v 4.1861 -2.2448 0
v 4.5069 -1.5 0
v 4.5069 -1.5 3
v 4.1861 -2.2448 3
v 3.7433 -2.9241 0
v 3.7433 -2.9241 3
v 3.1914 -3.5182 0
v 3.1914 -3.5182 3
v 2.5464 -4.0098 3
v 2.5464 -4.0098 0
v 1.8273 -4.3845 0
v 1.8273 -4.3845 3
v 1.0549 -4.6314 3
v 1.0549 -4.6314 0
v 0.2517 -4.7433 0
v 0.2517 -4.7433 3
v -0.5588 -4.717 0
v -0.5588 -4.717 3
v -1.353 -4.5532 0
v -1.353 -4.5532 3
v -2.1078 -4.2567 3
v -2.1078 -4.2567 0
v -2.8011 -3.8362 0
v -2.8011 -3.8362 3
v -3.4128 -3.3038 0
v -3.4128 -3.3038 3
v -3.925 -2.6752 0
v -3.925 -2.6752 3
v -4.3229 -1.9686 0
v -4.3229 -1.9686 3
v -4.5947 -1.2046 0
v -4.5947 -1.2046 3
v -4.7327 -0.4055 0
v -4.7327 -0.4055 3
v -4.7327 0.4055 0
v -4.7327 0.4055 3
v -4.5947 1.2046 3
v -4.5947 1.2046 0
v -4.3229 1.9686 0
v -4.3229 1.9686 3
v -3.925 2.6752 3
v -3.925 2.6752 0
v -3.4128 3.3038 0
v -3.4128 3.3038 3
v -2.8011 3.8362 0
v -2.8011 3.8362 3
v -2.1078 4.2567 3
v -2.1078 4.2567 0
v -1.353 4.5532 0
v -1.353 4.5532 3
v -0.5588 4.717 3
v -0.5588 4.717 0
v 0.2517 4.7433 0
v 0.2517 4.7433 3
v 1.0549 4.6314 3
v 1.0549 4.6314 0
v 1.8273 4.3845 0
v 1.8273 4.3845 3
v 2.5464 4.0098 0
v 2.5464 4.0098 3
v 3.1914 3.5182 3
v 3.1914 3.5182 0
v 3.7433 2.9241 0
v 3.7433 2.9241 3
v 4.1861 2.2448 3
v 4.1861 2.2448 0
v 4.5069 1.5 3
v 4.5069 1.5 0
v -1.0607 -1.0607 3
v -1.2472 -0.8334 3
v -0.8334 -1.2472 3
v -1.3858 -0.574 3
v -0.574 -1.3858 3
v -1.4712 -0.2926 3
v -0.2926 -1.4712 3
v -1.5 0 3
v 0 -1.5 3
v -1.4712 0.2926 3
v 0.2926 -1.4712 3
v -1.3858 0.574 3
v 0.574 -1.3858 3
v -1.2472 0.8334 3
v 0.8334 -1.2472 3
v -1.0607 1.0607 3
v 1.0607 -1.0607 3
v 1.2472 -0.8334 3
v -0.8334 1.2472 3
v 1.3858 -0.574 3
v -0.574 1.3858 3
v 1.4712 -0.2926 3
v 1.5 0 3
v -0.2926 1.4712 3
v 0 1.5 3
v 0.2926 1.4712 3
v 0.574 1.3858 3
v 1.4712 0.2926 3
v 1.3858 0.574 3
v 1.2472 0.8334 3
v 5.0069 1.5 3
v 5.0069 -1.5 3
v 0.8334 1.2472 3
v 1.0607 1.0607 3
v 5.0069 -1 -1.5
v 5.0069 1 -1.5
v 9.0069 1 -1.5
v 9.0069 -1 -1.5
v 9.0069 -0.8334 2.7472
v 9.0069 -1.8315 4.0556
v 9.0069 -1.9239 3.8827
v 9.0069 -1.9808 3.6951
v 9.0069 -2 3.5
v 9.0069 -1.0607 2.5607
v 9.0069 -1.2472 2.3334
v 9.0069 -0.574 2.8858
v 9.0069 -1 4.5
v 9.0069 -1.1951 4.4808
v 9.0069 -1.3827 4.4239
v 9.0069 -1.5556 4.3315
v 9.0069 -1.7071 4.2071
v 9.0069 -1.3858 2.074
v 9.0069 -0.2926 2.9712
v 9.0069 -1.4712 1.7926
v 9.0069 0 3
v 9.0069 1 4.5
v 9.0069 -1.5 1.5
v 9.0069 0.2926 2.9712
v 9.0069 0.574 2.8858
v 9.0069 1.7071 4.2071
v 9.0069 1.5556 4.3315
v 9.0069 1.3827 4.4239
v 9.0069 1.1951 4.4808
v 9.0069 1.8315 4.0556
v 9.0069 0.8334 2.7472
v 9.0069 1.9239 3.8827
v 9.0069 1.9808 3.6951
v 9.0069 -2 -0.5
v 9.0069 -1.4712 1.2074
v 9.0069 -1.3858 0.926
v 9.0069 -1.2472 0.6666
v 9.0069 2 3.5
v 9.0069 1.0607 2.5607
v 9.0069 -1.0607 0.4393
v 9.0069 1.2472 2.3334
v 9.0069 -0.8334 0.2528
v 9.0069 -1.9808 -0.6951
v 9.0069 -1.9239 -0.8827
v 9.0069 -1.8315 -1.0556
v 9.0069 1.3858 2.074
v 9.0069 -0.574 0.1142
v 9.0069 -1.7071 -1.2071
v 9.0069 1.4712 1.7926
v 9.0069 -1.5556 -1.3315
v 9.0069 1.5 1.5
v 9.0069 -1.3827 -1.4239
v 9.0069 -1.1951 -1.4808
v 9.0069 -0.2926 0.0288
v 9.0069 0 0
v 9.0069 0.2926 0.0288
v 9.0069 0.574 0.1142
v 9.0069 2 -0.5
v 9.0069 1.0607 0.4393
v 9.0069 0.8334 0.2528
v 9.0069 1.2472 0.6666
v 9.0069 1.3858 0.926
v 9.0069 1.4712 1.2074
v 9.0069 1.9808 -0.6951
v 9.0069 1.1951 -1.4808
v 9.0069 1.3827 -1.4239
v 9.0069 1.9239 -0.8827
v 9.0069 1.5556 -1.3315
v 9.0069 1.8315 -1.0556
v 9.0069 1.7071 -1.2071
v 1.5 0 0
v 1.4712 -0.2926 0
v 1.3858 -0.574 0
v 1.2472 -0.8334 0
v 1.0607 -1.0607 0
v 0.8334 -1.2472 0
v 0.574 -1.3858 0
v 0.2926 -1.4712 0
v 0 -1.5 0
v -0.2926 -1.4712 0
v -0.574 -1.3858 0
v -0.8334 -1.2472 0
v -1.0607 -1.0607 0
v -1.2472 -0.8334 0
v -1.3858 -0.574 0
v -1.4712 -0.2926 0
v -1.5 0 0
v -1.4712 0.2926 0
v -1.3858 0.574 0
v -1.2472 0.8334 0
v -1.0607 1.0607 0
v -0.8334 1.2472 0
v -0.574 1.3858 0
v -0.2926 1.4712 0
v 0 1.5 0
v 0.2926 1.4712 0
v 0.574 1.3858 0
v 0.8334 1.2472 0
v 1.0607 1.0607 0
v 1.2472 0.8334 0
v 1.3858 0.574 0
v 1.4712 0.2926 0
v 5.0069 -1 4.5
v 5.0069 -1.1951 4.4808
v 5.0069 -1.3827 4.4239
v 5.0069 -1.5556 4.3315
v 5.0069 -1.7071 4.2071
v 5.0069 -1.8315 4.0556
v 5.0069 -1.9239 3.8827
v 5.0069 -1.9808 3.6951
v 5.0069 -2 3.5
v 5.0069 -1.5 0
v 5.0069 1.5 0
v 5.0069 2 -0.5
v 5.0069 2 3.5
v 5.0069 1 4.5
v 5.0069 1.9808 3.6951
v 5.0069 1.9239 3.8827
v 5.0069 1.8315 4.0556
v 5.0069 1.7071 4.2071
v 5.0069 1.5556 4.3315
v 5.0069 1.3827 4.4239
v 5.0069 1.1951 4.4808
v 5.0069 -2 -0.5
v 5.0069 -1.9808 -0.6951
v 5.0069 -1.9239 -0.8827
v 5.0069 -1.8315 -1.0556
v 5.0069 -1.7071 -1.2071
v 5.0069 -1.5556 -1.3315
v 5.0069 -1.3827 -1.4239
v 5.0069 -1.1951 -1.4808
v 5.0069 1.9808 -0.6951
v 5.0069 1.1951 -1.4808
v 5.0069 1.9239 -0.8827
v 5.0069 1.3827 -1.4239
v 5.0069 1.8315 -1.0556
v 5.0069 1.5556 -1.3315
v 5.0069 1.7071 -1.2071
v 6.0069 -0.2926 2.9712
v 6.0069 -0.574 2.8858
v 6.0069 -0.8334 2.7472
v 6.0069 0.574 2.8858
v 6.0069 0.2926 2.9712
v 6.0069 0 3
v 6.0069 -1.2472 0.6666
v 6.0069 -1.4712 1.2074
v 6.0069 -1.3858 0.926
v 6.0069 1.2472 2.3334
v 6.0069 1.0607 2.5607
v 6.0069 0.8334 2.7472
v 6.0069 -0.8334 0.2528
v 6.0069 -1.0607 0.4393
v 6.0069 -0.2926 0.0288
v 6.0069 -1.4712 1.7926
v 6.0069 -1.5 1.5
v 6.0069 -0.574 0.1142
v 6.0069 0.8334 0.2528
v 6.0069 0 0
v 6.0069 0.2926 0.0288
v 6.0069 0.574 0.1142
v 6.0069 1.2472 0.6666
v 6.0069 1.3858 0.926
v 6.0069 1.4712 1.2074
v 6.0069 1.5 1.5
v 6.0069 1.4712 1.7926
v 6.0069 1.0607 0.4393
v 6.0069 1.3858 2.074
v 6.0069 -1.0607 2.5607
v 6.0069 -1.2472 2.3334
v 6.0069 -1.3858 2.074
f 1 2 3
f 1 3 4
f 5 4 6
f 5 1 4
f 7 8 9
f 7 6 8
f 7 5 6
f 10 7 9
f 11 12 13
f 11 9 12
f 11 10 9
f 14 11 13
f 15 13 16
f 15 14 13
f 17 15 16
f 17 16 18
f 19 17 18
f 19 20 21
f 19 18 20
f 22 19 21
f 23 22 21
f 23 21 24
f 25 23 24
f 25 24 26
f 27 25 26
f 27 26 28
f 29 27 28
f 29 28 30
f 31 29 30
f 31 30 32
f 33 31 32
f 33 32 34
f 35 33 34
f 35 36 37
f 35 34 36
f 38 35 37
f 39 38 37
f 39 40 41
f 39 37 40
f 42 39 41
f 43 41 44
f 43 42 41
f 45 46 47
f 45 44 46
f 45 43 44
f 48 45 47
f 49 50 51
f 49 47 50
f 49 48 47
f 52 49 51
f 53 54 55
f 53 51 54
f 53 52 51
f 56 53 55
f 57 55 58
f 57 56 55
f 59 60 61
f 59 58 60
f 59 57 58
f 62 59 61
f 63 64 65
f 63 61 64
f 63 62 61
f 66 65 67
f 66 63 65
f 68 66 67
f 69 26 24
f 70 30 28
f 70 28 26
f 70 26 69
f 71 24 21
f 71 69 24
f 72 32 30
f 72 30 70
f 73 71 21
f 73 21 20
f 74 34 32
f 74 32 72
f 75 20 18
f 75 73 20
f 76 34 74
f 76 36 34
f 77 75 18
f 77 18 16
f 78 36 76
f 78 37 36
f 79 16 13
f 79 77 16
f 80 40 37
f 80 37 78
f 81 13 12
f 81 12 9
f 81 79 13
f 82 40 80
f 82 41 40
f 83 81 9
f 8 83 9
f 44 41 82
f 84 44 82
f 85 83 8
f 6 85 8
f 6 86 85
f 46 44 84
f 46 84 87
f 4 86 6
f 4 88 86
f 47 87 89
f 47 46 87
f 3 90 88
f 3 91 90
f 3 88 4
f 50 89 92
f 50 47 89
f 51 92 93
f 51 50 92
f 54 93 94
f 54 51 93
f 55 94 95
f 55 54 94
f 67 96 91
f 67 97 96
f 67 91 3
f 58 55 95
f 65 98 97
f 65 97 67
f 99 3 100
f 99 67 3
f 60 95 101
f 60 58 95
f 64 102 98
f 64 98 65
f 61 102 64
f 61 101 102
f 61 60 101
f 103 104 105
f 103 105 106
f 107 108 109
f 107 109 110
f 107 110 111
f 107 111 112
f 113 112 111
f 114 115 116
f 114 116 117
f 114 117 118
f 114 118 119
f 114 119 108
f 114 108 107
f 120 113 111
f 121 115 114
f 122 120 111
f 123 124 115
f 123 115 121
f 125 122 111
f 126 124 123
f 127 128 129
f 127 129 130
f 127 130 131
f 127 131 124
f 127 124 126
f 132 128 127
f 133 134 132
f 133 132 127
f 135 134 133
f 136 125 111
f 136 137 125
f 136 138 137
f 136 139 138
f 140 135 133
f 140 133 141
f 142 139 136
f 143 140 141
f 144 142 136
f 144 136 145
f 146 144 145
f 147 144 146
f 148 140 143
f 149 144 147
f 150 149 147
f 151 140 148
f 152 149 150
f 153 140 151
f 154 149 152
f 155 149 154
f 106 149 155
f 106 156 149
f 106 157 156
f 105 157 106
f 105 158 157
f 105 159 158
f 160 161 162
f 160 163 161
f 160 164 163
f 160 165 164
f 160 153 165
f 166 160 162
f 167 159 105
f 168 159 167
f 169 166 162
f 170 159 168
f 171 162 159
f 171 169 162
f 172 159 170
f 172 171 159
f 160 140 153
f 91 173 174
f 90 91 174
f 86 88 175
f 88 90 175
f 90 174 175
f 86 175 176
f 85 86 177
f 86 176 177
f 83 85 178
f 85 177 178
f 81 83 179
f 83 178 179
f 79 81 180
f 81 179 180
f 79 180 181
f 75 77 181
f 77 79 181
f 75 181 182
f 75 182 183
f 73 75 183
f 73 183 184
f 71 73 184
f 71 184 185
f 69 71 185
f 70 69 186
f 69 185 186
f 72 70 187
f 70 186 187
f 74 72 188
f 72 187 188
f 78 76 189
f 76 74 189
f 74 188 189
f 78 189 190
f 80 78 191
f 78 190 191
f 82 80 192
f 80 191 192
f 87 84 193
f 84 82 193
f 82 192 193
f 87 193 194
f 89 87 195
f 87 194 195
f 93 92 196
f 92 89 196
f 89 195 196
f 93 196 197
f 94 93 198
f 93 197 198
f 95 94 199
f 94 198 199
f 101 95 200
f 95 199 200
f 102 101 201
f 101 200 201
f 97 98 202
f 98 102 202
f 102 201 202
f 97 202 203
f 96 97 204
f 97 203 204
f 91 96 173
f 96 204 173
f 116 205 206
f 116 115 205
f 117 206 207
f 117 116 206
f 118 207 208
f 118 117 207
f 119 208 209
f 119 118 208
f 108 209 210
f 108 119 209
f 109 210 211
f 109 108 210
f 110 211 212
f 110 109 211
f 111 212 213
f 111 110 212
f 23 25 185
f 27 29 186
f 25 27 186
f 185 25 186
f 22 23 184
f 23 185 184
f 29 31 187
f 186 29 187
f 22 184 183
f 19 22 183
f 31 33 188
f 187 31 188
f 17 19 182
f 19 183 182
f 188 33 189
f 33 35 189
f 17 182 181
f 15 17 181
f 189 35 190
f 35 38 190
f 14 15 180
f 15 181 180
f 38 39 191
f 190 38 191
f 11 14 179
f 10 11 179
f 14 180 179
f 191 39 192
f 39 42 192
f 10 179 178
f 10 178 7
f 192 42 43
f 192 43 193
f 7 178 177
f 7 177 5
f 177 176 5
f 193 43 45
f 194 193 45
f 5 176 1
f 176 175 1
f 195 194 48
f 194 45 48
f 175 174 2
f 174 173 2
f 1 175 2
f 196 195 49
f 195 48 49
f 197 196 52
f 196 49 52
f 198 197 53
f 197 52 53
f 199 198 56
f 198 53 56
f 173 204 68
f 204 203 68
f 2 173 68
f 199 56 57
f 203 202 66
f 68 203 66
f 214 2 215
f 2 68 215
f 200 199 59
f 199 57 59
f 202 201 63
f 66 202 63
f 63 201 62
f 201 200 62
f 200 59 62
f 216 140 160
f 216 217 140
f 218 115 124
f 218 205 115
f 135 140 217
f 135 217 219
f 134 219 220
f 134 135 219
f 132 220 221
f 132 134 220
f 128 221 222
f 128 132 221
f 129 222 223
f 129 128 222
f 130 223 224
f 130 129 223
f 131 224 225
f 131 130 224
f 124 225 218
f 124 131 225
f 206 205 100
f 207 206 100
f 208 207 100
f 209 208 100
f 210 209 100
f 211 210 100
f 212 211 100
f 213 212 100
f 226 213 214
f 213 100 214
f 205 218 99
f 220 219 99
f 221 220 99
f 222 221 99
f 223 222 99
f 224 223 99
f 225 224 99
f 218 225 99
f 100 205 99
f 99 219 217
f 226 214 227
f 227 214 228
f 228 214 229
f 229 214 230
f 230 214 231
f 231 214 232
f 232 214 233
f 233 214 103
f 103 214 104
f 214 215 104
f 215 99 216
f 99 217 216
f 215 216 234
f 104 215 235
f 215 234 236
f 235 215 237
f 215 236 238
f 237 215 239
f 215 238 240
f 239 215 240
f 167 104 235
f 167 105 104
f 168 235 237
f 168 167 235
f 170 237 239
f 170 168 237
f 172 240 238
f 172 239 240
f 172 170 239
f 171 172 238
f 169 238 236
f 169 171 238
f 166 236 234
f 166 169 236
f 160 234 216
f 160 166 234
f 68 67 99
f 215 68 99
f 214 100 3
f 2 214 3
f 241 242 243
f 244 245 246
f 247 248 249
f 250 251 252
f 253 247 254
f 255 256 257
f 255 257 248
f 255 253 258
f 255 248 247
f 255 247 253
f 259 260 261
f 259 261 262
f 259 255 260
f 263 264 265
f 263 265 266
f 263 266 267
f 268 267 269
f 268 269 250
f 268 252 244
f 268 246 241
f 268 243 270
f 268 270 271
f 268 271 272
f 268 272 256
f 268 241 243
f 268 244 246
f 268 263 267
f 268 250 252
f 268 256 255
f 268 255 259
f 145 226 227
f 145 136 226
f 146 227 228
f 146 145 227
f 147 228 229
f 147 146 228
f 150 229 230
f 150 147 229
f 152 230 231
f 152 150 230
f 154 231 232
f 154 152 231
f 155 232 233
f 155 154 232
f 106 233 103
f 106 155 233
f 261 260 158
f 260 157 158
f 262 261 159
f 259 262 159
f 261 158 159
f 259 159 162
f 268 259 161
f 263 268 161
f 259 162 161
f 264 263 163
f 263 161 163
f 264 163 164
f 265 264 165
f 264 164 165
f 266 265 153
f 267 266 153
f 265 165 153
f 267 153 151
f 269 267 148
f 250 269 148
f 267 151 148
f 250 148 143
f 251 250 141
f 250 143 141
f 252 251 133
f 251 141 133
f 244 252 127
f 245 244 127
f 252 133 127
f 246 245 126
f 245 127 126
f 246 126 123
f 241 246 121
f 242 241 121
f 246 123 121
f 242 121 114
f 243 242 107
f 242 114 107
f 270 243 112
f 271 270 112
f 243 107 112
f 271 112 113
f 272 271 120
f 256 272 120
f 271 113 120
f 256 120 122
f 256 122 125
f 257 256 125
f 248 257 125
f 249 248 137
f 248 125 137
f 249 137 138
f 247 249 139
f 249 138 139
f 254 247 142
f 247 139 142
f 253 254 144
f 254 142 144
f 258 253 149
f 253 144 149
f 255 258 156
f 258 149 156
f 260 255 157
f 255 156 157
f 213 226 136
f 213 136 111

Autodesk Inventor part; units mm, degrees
ref_plane "YZ Plane" through (0, 0, 0) normal (1, 0, 0) x (0, 1, 0)
ref_plane "XZ Plane" through (0, 0, 0) normal (0, 1, 0) x (-1, 0, 0)
ref_plane "XY Plane" through (0, 0, 0) normal (0, 0, 1) x (1, 0, 0)
sketch "Sketch1" plane through (0, 0, 0) normal (0, 0, 1) x (1, 0, 0)
  circle A0 centre (0, 0) radius 1.5
  circle A1 centre (0, 0) radius 4.75
  dimension "d0" = 3
  dimension "d1" = 9.5
extrude "Extrusion1" add sketch "Sketch1" along normal blind 3
sketch "Sketch2" plane through (0, 0, 3) normal (0, 0, 1) x (1, 0, 0)
  circle A0 centre (0, 0) radius 4.75 projected
  line L0 (4.5069, 1.5) -> (5.0069, 1.5)
  line L1 (5.0069, 1.5) -> (5.0069, -1.5)
  line L2 (5.0069, -1.5) -> (4.5069, -1.5)
  line L3 (4.5069, -1.5) -> (4.5069, 1.5)
  point P0 (4.5069, 0)
  dimension "d4" = 3
  dimension "d5" = 0.5
extrude "Extrusion2" add sketch "Sketch2" against normal blind 3 contours A0 L0 L1 L2
sketch "Sketch4" plane through (5.0069, -1.5, 3) normal (1, 0, 0) x (0, 0, -1)
  line L0 (-1.5, 3.5) -> (4.5, 3.5)
  line L1 (4.5, 3.5) -> (4.5, -0.5)
  line L2 (4.5, -0.5) -> (-1.5, -0.5)
  line L3 (-1.5, -0.5) -> (-1.5, 3.5)
  line L4 (0, 3) -> (3, 3) projected
  line L5 (0, 0) -> (0, 3) projected
  point P0 (3, 1.5)
  point P1 (1.5, 3)
  point P2 (1.5, 3.5)
  point P3 (0, 1.5)
  point P4 (-1.5, 1.5)
  dimension "d9" = 6
  dimension "d10" = 4
extrude "Extrusion3" add sketch "Sketch4" along normal blind 4
fillet "Fillet1" radius 1 4 edges at (7.0069, 2, 4.5) (7.0069, -2, 4.5) (7.0069, -2, -1.5) (7.0069, 2, -1.5)
sketch "Sketch6" plane through (9.0069, -1.5, 3) normal (1, 0, 0) x (0, 0, -1)
  circle A0 centre (1.5, 1.5) radius 1.5
  line L0 (3.5, 3.5) -> (-0.5, 3.5) projected
  line L1 (-1.5, 2.5) -> (-1.5, 0.5) projected
  point P0 (3, 1.5)
  point P1 (-1.5, 1.5)
  point P2 (1.5, 3.5)
  dimension "d14" = 3
extrude "Extrusion4" cut sketch "Sketch6" against normal blind 3
properties part number "Arm7" material "ABS Plastic"
